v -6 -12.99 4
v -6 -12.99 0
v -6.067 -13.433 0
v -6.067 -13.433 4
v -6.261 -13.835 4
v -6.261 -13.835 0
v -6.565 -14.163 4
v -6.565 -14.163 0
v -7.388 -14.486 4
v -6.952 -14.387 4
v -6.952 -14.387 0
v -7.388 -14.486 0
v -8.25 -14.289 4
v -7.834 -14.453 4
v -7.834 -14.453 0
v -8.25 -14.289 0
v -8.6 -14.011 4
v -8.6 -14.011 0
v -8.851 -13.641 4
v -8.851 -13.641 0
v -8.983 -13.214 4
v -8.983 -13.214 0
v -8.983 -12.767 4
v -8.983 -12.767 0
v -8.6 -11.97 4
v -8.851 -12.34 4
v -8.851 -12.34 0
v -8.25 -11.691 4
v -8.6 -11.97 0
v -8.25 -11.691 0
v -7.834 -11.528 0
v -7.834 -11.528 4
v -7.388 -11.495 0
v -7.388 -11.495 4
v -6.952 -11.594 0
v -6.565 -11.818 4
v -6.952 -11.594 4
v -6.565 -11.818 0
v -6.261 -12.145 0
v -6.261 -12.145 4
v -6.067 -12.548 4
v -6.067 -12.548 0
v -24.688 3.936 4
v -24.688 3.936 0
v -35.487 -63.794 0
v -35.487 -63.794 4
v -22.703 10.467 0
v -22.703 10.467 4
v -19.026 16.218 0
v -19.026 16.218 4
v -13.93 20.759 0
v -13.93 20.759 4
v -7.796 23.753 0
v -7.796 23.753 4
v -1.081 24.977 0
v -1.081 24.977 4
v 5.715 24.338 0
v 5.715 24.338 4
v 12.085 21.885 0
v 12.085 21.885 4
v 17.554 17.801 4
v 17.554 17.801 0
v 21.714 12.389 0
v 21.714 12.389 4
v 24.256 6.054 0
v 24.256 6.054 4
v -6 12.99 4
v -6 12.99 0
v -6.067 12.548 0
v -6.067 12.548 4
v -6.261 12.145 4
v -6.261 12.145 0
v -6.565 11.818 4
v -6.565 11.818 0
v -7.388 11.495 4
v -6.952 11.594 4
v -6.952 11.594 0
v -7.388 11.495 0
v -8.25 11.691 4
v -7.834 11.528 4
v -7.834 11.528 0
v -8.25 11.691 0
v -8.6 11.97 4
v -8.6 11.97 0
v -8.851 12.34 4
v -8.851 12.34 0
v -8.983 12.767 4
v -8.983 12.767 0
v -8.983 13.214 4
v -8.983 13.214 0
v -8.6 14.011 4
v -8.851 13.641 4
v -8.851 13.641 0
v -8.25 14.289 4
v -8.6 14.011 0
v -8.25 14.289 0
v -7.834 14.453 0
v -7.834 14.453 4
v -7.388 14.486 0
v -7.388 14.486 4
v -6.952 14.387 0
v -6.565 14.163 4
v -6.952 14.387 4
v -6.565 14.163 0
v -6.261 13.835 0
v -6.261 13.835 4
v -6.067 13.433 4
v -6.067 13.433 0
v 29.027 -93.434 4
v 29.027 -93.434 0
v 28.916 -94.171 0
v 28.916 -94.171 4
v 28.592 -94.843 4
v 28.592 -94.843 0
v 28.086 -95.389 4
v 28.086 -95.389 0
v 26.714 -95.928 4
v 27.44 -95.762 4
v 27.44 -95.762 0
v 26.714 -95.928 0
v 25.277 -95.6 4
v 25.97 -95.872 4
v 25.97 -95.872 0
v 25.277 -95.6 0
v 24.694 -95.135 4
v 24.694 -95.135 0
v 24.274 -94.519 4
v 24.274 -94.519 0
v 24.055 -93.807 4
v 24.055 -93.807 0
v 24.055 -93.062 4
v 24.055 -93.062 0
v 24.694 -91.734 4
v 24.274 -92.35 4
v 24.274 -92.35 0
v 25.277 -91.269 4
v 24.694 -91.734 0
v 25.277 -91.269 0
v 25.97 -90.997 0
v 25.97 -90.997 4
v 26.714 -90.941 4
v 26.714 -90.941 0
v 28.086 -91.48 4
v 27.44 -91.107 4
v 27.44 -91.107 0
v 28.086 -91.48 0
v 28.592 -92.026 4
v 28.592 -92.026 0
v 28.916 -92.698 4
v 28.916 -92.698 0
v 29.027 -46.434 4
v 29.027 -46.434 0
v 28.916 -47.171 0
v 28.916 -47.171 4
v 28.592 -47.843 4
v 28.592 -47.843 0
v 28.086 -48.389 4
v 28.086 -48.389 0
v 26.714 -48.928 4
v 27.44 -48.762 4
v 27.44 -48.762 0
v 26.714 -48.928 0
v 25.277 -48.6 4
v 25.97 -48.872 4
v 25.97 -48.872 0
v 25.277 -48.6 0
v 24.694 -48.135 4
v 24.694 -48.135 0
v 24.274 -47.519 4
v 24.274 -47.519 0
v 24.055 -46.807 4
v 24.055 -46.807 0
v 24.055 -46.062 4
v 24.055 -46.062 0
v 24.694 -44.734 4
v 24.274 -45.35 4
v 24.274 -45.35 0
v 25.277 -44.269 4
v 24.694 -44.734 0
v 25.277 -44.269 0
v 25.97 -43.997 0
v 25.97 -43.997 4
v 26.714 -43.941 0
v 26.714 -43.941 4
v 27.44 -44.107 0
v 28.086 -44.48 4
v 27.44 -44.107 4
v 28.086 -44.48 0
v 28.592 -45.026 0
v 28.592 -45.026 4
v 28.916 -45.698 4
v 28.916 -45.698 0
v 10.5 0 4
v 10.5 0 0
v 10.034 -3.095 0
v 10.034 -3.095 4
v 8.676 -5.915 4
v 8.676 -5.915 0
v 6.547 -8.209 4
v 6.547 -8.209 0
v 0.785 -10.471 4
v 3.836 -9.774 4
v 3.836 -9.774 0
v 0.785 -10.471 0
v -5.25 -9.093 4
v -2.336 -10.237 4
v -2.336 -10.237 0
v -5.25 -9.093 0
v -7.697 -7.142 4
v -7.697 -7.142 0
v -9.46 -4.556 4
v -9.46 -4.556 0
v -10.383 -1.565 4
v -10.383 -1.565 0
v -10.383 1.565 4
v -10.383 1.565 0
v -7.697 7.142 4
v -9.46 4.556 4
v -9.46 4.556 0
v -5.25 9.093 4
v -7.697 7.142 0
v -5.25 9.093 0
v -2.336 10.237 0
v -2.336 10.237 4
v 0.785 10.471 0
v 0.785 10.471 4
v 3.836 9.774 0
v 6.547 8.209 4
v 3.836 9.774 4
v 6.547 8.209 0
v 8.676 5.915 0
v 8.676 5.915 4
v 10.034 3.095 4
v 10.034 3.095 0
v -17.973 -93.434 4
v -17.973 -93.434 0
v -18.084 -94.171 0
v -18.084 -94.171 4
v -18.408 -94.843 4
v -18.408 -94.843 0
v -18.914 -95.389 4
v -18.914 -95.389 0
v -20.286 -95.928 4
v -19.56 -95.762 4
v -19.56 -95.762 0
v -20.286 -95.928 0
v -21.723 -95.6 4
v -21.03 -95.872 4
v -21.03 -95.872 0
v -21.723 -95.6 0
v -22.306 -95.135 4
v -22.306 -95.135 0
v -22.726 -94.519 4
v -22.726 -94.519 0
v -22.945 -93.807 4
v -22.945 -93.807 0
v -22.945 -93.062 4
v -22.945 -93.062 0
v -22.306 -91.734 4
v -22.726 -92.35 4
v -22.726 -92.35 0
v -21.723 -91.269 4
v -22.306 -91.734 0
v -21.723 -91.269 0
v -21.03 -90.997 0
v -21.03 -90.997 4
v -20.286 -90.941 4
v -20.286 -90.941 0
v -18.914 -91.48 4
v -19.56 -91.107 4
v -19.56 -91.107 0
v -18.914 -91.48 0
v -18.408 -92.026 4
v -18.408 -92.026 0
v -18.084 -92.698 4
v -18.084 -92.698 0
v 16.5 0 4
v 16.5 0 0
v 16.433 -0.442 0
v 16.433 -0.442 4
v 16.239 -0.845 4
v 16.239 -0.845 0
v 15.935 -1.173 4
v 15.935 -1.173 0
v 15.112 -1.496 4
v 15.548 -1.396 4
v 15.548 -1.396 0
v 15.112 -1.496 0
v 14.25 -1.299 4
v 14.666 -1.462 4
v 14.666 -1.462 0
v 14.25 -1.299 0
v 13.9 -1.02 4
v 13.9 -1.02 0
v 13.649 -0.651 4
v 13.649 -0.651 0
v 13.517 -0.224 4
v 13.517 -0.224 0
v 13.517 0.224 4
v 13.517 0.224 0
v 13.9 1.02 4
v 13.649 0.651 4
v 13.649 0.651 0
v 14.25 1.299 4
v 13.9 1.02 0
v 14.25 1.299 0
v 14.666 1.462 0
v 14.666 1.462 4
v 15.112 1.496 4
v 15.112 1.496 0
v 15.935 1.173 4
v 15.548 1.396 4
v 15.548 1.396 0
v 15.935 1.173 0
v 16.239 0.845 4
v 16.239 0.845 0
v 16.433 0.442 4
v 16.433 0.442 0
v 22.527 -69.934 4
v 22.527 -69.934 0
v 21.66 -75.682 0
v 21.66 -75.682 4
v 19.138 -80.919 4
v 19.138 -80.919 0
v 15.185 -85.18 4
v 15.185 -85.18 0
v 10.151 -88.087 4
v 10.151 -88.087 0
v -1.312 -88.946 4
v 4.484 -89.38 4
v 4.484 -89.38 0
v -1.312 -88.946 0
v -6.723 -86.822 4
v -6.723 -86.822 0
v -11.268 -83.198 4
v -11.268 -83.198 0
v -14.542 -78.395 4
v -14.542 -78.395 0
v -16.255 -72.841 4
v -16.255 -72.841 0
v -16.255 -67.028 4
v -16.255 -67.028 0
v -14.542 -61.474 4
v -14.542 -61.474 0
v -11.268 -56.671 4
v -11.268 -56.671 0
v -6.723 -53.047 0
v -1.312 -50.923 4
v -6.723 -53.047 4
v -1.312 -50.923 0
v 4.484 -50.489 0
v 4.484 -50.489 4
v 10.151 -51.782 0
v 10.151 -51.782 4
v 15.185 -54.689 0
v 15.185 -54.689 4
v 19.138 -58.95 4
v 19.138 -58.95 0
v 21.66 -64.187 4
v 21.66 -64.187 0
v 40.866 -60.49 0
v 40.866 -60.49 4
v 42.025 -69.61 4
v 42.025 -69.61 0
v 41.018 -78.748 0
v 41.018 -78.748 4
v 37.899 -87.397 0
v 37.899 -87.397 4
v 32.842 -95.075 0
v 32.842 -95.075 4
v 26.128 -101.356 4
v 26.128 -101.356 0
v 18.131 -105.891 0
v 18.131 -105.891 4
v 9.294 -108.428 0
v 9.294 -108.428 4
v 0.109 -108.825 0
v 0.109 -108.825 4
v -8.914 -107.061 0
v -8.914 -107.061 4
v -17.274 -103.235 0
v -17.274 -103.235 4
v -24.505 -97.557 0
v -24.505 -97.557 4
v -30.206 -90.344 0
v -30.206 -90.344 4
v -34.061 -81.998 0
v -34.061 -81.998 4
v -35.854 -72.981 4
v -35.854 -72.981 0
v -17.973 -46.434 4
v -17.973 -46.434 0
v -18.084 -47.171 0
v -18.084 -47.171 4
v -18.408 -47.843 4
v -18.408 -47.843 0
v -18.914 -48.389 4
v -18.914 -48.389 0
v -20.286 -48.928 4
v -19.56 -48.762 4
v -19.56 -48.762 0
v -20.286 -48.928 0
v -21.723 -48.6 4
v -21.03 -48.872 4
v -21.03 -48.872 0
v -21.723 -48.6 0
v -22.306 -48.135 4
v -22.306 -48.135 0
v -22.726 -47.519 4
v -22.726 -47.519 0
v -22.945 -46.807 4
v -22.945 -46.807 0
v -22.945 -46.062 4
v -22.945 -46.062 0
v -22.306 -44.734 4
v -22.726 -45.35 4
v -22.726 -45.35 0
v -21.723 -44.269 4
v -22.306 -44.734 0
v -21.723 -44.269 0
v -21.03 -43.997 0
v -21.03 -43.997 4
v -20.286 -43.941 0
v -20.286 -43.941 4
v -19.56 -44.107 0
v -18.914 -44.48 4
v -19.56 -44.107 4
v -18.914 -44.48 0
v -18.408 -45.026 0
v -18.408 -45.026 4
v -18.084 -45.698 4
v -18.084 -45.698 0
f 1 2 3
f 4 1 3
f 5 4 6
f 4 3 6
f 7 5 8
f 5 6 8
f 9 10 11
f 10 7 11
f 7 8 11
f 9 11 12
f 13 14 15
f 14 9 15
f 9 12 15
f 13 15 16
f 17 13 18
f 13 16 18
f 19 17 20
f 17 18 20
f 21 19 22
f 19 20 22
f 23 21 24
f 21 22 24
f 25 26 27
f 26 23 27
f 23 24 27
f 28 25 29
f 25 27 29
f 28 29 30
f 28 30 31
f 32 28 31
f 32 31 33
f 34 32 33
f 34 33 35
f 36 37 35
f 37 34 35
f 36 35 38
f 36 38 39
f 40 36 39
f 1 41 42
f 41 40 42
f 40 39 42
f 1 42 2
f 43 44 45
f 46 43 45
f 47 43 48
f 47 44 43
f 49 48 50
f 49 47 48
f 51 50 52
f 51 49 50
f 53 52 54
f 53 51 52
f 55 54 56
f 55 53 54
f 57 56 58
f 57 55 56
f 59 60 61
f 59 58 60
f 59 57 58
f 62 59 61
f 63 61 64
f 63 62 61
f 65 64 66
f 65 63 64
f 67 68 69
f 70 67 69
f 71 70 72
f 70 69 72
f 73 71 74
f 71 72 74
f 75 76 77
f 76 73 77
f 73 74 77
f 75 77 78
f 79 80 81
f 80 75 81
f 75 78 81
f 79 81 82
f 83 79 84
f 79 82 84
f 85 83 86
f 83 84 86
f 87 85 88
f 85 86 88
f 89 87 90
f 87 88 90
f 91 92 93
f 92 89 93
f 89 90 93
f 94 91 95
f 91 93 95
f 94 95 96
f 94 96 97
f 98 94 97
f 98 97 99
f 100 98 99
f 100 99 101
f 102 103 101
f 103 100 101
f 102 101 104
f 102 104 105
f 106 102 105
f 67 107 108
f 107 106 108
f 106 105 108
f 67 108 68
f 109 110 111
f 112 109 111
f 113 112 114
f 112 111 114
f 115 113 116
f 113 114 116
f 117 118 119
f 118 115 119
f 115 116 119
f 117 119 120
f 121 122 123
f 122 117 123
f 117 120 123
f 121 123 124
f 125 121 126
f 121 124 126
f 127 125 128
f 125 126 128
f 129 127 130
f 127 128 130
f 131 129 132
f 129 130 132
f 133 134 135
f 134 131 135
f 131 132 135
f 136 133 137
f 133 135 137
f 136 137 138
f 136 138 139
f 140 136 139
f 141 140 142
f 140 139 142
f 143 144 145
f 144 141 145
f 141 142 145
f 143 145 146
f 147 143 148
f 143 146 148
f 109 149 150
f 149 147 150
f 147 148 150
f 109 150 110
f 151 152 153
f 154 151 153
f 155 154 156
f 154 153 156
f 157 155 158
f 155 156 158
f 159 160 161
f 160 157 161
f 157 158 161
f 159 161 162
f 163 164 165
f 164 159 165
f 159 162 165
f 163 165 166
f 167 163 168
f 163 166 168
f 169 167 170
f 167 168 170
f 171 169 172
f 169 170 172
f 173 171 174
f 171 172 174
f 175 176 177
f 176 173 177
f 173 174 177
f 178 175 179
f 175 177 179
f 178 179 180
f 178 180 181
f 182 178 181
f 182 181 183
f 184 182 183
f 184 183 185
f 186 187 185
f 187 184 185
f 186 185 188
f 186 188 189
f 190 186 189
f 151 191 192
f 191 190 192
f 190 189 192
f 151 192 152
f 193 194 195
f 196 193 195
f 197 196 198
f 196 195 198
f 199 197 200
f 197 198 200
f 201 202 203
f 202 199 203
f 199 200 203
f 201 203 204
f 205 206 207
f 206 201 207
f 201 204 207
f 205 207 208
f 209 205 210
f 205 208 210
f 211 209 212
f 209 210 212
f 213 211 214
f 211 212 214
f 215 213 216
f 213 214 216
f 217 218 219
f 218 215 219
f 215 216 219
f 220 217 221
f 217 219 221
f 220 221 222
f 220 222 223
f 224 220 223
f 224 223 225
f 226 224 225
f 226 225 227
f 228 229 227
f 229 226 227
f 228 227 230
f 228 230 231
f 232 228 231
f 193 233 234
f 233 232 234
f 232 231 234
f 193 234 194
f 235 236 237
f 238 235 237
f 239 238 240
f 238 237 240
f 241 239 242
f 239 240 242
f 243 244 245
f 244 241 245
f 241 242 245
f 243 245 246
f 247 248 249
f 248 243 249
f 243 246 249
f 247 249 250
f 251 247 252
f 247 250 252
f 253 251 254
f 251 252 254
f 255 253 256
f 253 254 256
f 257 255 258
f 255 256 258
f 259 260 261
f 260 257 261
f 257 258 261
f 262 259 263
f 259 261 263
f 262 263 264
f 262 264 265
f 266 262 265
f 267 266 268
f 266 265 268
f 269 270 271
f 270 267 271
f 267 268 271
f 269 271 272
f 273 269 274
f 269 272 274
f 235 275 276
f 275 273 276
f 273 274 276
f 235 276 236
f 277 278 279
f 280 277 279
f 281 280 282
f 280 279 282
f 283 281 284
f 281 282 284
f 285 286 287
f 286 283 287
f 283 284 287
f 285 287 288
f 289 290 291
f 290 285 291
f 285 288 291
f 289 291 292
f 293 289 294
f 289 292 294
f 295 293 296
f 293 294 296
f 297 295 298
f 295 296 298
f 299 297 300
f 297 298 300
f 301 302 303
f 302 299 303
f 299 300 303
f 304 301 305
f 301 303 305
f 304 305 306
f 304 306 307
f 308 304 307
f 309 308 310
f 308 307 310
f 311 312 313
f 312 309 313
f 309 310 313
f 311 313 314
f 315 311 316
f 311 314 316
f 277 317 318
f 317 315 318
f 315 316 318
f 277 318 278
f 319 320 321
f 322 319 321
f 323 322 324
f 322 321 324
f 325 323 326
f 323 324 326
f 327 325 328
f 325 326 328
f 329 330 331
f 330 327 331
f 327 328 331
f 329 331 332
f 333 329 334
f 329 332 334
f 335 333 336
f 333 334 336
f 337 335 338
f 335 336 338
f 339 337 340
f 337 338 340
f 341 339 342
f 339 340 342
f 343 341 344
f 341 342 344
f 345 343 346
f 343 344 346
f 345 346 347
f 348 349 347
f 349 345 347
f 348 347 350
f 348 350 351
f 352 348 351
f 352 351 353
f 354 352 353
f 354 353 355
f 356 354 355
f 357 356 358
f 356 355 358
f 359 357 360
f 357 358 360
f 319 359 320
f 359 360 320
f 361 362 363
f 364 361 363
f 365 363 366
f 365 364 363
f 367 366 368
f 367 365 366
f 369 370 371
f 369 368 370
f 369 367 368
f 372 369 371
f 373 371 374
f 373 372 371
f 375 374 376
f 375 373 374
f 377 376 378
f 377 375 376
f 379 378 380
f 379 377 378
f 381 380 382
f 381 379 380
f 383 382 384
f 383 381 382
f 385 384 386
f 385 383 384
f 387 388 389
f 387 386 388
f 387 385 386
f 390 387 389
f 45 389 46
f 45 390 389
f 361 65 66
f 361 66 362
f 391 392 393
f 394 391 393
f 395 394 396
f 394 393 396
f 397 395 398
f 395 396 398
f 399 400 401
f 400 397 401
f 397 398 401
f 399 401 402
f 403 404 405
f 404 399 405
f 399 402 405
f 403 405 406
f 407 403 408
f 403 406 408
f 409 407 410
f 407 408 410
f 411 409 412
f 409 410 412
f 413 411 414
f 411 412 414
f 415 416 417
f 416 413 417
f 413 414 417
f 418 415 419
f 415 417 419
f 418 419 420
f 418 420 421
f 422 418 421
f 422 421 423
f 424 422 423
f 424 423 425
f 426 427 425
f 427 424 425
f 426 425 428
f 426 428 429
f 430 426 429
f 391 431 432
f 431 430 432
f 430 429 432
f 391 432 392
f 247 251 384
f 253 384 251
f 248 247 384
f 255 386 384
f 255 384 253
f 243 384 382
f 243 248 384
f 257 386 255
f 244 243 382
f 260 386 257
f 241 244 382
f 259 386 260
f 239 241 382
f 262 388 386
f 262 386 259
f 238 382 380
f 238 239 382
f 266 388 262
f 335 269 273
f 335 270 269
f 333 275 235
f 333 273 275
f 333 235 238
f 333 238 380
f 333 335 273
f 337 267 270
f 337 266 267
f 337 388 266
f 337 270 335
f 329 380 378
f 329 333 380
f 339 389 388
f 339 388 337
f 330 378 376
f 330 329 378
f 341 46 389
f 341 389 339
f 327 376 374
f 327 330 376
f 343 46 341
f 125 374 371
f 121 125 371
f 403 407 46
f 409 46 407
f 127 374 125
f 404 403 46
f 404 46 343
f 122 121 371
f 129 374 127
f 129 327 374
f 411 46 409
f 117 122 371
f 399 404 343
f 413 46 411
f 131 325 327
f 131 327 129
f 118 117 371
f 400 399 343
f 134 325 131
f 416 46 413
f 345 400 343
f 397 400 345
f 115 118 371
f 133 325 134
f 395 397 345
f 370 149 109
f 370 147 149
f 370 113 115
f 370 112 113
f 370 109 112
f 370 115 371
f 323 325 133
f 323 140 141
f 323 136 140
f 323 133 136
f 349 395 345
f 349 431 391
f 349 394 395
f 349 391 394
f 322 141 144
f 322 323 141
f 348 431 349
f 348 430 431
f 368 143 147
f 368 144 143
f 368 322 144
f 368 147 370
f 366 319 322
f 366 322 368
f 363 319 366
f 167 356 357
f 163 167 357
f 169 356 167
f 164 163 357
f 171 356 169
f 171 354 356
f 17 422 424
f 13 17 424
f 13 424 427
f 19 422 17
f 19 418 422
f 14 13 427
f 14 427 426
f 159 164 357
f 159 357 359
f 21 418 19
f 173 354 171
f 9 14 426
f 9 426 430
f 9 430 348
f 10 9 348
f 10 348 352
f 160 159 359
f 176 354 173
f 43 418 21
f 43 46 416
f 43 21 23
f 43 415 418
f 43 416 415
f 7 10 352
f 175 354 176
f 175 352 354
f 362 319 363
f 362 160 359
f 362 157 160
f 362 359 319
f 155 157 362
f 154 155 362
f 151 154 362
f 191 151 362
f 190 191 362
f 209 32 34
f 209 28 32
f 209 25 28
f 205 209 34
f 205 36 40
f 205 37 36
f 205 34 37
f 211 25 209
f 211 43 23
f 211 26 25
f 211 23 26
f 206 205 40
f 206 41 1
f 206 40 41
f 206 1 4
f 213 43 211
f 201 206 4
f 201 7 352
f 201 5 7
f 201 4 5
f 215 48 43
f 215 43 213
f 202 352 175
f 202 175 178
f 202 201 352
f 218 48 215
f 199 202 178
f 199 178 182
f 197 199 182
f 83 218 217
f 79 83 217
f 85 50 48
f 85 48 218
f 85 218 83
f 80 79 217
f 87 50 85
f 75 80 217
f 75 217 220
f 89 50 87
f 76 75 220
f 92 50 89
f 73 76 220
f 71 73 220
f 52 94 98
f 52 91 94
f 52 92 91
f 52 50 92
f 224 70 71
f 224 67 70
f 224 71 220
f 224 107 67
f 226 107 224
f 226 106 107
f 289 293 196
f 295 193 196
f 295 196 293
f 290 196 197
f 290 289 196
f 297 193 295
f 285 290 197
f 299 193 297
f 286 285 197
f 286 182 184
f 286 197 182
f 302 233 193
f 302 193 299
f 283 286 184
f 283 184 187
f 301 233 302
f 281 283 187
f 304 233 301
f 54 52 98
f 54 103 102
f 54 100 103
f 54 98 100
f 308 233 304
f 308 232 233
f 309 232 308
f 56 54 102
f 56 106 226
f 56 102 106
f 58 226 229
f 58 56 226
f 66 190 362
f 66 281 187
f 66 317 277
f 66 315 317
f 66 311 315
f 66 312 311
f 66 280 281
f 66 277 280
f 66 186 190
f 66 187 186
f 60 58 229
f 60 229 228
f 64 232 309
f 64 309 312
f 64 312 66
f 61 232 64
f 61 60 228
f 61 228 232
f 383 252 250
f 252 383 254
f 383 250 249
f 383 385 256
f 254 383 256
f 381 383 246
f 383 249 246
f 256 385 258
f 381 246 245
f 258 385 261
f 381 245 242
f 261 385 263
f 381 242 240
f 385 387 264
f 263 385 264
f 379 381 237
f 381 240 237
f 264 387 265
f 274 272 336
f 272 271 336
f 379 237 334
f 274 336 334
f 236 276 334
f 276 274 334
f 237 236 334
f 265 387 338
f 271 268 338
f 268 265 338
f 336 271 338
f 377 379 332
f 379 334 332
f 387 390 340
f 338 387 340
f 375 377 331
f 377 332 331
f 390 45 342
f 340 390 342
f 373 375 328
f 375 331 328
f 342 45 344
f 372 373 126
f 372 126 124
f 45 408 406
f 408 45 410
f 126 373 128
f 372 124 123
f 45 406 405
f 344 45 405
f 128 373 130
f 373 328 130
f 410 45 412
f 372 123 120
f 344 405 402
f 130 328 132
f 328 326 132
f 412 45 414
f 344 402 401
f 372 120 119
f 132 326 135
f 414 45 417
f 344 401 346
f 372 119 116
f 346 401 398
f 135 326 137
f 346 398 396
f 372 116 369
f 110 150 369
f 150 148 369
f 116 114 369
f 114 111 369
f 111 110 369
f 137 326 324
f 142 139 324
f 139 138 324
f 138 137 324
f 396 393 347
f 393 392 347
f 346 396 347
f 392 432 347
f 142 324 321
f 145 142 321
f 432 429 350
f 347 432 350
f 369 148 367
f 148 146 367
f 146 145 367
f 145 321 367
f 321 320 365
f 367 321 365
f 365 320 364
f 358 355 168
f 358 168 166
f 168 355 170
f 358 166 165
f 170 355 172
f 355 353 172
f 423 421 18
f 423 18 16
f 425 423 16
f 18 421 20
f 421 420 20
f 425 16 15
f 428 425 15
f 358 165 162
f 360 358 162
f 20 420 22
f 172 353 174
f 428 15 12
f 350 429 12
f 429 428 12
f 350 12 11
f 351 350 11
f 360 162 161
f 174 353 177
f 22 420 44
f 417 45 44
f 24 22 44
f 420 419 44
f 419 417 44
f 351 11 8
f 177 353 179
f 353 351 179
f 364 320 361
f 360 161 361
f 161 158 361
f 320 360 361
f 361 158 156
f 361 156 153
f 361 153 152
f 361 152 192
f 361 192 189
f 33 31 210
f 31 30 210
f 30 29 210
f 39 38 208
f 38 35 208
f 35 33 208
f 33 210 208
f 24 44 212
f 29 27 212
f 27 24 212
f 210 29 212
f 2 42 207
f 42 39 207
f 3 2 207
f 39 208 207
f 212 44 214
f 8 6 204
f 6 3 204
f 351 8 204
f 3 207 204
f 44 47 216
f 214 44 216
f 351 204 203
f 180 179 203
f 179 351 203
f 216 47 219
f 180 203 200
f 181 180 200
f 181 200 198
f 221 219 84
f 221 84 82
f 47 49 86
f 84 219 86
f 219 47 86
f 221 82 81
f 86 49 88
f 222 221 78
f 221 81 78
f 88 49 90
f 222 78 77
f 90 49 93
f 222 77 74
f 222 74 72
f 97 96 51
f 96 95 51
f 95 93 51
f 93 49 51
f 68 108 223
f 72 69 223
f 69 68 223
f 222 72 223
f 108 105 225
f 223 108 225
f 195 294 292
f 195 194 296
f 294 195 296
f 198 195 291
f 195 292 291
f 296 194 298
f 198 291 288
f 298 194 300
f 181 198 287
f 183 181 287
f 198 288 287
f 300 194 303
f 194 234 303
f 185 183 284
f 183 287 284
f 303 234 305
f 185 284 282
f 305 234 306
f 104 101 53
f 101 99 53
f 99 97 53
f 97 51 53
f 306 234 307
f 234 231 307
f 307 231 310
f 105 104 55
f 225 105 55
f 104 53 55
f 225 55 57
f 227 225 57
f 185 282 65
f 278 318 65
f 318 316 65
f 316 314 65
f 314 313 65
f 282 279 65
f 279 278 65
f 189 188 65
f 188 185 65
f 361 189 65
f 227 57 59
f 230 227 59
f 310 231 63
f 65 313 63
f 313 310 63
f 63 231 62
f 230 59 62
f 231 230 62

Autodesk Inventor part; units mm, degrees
ref_plane "YZ Plane" through (0, 0, 0) normal (1, 0, 0) x (0, 1, 0)
ref_plane "XZ Plane" through (0, 0, 0) normal (0, 1, 0) x (-1, 0, 0)
ref_plane "XY Plane" through (0, 0, 0) normal (0, 0, 1) x (1, 0, 0)
sketch "草圖1" plane through (0, 0, 0) normal (0, 0, 1) x (1, 0, 0)
  circle A0 centre (15, 0) radius 1.5 projected
  circle A1 centre (-7.5, -12.9904) radius 1.5 projected
  circle A2 centre (-7.5, 12.9904) radius 1.5 projected
  circle A3 centre (0, 0) radius 9.94 projected
  arc A4 (24.2558, 6.0545) -> (-24.6882, 3.9362) centre (0, 0) ccw
  arc A5 (-25.4732, -69.9345) -> (3.0268, -98.4345) centre (3.0268, -69.9345) ccw projected
  arc A6 (3.0268, -98.4345) -> (31.5268, -69.9345) centre (3.0268, -69.9345) ccw projected
  arc A7 (-35.4868, -63.7941) -> (40.8658, -60.4896) centre (3.0268, -69.9345) ccw
  line L0 (24.2558, 6.0545) -> (40.8658, -60.4896)
  line L1 (-24.6882, 3.9362) -> (-35.4868, -63.7941)
  circle A8 centre (26.5268, -93.4345) radius 2.5 projected
  circle A9 centre (-20.4732, -93.4345) radius 2.5 projected
  circle A10 centre (-20.4732, -46.4345) radius 2.5 projected
  circle A11 centre (26.5268, -46.4345) radius 2.5 projected
  circle A12 centre (3.0268, -69.9345) radius 19 projected
  circle A13 centre (3.0268, -69.9345) radius 19.5
  circle A14 centre (0, 0) radius 10.5
  point P0 (0, 0)
  dimension "d1" = 50
  dimension "d2" = 78
  dimension "d3" = 39
  dimension "d4" = 21
extrude "擠出1" add sketch "草圖1" along normal blind 4 contours L0 A7 L1 A4
properties part number "Linker_Structure"
